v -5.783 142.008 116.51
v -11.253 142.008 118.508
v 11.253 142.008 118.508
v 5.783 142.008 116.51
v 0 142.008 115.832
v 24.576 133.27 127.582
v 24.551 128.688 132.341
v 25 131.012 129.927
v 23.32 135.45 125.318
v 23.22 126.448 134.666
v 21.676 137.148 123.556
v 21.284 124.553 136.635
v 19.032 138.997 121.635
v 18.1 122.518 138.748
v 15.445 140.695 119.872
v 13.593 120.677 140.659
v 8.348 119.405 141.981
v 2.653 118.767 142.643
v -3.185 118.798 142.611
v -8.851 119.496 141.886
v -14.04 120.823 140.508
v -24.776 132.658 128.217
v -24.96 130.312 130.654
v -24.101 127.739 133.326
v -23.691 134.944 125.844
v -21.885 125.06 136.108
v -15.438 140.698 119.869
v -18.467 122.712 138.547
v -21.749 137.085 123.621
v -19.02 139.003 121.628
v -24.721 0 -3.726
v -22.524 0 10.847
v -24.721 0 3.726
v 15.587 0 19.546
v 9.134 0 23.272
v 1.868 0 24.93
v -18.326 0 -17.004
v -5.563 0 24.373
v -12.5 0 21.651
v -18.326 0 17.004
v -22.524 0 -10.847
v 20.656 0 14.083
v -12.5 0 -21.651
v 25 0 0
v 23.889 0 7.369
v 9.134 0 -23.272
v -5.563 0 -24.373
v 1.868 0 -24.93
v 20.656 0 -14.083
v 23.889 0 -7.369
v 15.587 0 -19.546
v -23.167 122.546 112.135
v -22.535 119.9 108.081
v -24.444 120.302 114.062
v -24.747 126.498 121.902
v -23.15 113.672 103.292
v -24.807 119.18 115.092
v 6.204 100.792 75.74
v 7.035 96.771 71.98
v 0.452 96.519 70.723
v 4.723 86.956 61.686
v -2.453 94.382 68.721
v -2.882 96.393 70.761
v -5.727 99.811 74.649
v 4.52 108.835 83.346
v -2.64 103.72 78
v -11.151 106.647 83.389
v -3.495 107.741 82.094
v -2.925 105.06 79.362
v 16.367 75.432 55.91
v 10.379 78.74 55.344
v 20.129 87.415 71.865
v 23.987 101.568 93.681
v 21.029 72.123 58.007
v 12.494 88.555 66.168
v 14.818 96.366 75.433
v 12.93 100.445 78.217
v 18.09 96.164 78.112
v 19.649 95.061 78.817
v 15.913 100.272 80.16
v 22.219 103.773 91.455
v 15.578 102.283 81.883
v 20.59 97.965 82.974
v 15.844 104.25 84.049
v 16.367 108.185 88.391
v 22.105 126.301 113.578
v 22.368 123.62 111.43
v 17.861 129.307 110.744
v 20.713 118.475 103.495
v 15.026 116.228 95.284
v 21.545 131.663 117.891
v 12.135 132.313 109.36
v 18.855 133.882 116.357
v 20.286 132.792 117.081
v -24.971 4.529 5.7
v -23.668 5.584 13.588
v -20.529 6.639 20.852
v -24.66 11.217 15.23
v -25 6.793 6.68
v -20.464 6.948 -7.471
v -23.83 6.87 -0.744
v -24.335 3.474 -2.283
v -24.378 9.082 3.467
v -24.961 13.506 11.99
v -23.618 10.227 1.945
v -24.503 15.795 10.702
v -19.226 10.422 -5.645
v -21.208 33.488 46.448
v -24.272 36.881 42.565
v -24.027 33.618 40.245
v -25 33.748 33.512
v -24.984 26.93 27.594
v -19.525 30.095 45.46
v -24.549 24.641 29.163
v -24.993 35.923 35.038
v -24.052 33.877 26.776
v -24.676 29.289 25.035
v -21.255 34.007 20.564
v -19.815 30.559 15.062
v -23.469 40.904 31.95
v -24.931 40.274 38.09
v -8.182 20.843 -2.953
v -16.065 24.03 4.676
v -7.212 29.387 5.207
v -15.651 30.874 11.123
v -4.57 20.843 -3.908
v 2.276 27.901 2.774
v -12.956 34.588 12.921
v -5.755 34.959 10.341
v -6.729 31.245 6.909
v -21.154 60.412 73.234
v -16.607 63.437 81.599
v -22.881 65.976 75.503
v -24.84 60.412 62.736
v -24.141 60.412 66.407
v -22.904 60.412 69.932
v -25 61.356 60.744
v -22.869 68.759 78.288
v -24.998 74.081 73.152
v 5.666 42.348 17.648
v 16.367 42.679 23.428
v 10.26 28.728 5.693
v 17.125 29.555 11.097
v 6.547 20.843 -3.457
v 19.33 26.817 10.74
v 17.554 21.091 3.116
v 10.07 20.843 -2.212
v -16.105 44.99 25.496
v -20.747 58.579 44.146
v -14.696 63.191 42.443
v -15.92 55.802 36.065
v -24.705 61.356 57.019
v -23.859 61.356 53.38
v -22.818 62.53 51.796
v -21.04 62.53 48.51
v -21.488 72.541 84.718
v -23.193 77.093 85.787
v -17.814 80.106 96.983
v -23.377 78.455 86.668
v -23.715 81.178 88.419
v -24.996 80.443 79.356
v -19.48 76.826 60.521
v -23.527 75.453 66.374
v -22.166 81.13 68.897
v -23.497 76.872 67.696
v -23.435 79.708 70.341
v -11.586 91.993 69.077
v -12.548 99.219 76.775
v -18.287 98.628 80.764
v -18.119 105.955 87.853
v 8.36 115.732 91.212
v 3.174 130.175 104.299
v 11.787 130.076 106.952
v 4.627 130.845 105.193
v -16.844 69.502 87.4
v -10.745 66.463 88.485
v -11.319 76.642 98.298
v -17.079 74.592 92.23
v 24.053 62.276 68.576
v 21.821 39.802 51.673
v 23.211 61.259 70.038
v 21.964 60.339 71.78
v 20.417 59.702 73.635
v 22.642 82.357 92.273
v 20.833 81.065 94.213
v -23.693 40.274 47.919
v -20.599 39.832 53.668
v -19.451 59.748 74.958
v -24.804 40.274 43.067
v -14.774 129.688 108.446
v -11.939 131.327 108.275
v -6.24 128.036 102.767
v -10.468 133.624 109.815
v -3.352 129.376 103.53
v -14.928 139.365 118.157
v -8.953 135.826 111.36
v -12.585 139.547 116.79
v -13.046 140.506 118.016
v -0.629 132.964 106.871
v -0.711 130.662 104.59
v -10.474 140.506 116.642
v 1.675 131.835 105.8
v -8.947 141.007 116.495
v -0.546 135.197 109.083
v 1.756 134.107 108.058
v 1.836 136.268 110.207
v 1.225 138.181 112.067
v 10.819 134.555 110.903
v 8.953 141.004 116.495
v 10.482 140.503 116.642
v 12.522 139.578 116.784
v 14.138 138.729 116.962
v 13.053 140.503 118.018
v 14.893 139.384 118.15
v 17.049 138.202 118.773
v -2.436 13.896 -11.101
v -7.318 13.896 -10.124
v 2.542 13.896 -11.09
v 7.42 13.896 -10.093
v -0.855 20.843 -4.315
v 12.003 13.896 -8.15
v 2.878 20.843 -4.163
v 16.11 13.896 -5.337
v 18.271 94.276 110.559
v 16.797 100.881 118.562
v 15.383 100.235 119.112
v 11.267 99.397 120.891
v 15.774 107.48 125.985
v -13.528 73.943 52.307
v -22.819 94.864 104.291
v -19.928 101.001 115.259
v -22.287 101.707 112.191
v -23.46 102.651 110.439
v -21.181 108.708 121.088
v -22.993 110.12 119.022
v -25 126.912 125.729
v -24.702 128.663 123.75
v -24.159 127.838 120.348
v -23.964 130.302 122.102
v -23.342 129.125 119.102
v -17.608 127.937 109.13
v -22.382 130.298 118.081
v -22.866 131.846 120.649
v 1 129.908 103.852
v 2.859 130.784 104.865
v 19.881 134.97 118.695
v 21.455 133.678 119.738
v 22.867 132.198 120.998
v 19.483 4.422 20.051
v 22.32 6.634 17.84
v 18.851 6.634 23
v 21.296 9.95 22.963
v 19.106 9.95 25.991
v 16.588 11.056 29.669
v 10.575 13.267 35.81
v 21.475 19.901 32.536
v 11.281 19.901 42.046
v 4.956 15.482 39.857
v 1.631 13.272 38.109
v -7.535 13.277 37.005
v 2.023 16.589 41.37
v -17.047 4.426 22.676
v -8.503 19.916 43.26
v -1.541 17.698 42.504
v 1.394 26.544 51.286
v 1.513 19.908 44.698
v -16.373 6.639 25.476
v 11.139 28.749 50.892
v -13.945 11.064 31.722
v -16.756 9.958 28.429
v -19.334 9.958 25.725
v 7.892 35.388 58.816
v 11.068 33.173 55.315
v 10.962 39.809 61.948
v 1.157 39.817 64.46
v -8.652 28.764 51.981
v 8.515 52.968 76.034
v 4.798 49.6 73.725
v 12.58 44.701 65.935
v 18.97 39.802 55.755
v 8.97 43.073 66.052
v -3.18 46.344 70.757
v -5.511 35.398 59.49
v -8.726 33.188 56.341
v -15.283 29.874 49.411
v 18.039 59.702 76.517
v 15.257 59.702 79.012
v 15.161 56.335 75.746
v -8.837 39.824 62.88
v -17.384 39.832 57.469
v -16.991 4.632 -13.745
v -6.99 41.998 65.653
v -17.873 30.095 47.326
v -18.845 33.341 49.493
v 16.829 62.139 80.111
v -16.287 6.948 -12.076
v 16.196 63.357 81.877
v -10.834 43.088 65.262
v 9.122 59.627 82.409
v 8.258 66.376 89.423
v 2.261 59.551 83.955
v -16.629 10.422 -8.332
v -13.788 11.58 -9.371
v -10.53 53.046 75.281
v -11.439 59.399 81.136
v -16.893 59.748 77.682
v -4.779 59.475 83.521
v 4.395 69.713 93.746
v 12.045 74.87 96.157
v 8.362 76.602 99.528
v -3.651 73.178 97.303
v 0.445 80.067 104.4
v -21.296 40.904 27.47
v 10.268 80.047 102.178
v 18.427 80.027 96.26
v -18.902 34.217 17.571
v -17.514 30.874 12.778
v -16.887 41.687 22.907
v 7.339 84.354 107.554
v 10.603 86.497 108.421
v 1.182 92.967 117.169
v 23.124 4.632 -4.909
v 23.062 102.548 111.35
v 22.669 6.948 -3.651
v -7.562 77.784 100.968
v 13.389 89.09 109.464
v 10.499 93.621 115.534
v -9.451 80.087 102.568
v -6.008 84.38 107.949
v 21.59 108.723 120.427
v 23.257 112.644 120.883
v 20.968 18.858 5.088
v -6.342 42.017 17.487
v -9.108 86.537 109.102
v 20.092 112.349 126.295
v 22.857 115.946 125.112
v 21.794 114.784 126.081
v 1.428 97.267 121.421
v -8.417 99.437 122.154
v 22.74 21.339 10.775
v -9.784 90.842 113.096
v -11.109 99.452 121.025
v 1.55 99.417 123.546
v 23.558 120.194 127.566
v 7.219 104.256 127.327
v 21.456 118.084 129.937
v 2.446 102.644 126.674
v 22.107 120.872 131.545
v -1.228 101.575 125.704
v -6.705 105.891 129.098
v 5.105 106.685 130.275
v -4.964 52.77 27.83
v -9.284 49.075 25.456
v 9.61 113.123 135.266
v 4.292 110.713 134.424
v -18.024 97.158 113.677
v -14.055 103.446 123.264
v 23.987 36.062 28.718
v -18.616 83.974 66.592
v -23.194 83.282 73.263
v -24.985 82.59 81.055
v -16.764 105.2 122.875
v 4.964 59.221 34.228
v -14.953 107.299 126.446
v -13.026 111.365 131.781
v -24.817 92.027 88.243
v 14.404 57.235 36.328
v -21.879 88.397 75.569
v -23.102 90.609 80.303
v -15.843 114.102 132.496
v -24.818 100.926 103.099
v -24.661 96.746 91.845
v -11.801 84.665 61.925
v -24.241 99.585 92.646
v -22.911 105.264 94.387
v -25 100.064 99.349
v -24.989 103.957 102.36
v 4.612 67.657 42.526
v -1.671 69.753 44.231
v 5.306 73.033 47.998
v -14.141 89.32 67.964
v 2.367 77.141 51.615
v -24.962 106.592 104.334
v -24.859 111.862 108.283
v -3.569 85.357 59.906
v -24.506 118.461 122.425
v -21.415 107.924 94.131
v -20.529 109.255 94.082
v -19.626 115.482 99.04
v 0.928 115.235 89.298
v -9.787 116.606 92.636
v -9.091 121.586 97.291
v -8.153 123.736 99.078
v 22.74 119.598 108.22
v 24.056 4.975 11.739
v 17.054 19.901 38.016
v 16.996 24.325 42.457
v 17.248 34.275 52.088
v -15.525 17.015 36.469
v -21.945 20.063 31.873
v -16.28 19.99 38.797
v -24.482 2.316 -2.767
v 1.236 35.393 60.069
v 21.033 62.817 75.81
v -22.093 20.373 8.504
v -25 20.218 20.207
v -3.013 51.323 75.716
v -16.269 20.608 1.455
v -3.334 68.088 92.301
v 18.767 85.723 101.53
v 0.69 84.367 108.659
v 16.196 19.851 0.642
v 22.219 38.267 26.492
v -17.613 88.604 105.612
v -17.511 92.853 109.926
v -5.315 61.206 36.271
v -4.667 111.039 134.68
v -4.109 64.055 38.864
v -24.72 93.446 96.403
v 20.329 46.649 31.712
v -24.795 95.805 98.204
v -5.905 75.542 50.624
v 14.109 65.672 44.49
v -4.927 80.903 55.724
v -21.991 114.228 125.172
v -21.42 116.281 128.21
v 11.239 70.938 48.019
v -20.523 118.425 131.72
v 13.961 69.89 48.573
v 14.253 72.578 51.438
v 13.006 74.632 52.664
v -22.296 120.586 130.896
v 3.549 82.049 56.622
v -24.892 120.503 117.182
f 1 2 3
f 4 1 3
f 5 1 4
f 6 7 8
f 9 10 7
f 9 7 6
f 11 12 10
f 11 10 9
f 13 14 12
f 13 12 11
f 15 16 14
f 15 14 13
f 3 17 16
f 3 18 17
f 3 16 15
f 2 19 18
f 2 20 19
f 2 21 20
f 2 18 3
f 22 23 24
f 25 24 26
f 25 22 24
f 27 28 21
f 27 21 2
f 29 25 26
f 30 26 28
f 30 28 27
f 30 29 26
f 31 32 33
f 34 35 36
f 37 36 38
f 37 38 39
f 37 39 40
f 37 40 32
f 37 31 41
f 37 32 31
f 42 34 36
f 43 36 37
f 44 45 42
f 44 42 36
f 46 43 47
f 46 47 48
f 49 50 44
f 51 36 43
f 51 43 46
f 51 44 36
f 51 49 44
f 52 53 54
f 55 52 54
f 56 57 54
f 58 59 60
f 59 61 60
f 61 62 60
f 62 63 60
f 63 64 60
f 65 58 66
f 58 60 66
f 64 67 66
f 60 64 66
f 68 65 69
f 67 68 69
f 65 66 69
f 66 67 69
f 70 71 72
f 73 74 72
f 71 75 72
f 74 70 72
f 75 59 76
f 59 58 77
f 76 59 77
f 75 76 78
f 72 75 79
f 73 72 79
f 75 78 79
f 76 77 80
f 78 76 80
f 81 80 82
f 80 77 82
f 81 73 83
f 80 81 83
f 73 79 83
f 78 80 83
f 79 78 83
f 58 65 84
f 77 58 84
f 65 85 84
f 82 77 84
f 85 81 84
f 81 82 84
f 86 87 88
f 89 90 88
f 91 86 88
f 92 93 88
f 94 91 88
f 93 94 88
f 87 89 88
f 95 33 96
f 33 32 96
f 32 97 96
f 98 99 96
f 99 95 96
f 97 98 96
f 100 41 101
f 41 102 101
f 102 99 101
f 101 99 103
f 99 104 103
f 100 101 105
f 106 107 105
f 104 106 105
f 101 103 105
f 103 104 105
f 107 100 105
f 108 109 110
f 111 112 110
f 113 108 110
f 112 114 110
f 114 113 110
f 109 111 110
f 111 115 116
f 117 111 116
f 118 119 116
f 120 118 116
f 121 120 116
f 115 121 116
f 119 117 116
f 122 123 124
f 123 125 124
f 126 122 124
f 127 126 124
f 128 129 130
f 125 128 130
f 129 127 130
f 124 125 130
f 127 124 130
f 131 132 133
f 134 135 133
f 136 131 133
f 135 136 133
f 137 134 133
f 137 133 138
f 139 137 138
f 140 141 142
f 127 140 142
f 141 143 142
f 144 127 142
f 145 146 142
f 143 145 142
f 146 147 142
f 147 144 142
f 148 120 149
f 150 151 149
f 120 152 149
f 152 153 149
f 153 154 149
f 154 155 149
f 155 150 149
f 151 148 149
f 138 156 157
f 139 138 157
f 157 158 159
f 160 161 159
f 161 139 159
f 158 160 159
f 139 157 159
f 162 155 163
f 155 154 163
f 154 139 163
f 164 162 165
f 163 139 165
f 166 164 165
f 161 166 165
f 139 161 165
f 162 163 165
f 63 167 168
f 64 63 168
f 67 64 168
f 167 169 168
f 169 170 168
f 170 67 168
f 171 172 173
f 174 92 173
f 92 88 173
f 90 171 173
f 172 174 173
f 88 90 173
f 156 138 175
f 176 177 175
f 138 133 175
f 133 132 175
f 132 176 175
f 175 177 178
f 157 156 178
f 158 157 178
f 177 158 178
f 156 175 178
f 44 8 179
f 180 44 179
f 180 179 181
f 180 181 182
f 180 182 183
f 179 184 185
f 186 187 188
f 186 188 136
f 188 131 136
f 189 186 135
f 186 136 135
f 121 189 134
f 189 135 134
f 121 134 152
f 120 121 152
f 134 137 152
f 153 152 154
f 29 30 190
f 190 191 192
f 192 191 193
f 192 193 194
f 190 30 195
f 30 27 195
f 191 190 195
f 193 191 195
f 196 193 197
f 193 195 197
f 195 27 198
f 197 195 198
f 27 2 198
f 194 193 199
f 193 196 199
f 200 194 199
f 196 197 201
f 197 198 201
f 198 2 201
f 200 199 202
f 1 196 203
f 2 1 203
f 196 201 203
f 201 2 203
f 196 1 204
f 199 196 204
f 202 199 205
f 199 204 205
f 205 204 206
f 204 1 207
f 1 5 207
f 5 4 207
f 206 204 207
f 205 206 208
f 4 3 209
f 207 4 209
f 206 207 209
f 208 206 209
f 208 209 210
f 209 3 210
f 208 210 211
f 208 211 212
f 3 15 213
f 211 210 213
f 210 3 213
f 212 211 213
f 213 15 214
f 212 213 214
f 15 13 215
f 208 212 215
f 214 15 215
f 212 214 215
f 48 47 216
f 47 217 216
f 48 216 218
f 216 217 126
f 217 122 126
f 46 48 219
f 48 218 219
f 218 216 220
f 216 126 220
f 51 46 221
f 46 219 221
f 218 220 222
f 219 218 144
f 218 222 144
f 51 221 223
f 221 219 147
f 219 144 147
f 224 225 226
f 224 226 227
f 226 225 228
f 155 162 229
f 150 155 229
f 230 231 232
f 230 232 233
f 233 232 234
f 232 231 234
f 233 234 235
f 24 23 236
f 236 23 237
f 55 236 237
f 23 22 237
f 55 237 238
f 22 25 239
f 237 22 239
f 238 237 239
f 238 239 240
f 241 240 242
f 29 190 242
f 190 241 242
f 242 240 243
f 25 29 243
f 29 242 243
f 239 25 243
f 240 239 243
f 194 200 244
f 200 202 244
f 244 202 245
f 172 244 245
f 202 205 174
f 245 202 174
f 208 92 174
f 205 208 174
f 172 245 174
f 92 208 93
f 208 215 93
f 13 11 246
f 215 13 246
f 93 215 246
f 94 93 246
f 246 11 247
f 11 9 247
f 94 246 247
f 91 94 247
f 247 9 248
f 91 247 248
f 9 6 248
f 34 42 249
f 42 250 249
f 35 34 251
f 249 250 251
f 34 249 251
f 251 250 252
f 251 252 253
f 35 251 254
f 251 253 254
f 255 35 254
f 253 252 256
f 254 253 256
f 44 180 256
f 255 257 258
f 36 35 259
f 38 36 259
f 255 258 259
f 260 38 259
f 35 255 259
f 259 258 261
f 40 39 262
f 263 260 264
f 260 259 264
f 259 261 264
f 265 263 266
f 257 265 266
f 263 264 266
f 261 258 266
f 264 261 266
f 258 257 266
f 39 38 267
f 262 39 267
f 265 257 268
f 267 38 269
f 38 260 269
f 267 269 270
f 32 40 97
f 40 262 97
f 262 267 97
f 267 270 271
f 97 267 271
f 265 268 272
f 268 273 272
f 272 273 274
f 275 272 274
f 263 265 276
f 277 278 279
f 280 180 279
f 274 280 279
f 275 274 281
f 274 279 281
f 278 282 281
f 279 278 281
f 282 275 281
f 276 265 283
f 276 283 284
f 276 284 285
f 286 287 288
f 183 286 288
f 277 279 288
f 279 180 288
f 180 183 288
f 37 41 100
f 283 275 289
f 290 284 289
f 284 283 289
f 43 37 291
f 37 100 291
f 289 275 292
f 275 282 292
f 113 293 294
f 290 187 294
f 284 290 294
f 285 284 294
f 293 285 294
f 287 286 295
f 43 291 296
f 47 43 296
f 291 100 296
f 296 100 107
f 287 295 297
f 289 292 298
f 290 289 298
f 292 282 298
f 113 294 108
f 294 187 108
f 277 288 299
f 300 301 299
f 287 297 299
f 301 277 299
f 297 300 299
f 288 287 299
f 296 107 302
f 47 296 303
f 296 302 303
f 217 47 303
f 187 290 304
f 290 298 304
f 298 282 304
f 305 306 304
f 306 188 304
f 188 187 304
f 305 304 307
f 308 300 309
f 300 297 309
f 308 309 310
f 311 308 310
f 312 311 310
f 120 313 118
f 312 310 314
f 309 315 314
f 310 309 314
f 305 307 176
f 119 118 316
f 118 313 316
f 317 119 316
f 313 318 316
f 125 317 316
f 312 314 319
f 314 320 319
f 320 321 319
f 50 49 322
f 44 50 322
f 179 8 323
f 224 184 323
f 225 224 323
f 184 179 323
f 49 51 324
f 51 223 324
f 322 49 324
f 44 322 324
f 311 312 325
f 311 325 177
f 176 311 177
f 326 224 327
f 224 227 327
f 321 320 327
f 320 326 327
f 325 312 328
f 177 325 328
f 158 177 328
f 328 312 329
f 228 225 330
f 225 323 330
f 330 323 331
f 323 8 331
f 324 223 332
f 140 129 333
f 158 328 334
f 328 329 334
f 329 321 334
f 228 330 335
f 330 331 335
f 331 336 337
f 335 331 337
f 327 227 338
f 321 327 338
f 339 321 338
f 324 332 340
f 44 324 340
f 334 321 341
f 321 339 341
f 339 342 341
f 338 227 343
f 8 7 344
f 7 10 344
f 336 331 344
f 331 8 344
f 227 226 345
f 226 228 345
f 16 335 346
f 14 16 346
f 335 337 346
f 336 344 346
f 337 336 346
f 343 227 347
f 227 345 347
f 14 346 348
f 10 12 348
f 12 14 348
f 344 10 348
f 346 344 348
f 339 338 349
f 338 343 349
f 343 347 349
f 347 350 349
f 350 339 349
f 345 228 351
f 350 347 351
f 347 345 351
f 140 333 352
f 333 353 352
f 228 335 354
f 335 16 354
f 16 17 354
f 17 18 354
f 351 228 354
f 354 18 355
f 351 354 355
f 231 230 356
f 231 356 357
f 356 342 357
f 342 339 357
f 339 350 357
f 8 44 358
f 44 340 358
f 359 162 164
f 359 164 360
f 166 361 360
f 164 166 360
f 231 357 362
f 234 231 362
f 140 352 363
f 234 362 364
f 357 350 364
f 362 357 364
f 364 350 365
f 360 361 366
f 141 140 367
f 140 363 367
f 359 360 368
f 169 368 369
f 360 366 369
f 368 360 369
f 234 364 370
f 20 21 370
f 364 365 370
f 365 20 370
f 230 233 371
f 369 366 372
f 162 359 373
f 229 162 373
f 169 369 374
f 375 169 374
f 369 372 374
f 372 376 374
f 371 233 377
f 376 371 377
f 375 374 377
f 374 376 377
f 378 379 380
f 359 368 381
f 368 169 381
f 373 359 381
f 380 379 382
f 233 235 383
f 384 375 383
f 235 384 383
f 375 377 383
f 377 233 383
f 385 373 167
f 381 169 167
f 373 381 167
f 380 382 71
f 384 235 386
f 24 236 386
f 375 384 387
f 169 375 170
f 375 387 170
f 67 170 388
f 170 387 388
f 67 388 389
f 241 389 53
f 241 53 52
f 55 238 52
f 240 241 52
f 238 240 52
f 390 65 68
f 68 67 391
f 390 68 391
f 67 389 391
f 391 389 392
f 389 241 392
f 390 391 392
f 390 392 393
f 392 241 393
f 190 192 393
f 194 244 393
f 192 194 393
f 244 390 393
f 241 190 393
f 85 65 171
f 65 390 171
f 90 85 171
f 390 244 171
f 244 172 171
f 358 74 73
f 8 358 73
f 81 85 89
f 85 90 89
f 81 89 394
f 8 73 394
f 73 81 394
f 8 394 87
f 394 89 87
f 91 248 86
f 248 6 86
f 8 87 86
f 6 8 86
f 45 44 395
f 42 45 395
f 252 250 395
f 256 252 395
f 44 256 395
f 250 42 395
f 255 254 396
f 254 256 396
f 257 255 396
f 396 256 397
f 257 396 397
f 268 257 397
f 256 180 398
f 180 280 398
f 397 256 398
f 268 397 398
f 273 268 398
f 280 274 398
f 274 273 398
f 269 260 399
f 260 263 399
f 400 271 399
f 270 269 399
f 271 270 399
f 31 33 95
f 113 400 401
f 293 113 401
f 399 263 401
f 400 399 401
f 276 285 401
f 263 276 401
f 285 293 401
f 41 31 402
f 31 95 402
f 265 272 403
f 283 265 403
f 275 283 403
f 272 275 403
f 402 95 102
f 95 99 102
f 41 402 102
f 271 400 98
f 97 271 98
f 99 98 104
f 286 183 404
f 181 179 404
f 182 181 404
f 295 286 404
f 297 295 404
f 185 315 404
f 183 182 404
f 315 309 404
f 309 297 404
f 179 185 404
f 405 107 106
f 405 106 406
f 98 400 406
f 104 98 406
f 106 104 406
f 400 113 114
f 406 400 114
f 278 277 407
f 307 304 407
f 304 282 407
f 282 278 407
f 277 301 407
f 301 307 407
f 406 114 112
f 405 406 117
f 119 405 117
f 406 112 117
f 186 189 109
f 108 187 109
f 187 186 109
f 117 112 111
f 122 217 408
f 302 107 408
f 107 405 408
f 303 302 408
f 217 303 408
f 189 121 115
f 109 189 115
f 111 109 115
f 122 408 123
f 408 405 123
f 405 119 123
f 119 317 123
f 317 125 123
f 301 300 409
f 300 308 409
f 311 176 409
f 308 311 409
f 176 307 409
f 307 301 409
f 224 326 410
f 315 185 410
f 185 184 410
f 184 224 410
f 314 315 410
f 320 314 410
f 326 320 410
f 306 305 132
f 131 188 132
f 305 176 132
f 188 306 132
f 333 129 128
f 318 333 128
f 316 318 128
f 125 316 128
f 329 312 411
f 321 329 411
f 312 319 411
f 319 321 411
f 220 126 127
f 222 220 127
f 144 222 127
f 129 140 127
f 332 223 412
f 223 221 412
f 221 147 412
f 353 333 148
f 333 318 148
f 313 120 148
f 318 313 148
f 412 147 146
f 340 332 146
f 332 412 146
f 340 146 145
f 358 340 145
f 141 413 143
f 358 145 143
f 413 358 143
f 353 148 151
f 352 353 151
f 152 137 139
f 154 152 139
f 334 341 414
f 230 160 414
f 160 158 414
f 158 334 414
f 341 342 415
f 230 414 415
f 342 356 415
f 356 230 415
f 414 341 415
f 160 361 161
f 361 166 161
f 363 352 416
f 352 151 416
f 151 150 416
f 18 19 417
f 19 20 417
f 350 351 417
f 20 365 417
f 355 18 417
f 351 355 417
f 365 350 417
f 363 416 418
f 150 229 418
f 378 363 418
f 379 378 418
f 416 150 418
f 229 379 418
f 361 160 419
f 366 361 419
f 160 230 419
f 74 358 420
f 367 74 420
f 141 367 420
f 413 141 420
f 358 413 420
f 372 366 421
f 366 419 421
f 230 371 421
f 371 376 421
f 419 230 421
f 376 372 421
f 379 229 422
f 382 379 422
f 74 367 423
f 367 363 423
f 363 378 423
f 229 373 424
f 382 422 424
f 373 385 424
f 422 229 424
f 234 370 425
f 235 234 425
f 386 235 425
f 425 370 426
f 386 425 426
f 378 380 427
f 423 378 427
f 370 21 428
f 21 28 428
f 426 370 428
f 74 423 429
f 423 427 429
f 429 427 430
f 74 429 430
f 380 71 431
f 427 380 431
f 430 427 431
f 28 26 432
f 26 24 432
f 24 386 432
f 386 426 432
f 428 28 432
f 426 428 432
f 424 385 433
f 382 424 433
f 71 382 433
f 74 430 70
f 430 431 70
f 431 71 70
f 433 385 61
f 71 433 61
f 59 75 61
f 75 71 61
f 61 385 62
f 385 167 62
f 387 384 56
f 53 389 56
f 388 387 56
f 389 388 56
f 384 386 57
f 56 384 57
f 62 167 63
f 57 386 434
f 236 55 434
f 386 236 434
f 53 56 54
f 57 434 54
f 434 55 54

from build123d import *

# Parameters (mm, degrees)
F1_R     = 25
F4_DEPTH = 49
F5_DEPTH = 92


with BuildPart() as f2:
    # F2: sweep along a path in F0
    with BuildLine(Plane.YZ) as f2_path:
        Line((0, 0), (142.008164, 140.832104))
    # F1 (on Front) → F2 (sweep)
    with BuildSketch(Plane.XZ):
        Circle(F1_R)
    sweep(path=f2_path.line)

    # F3 (on Right) → F4 (cut)
    with BuildSketch(Plane.YZ):
        Polygon((114.125399, 147.46314), (143.182307, 117.288671), (148.33723, 180.407882), align=None)
    extrude(amount=-F4_DEPTH, mode=Mode.SUBTRACT)

    # F3 (on Right) → F5 (cut)
    with BuildSketch(Plane.YZ):
        Polygon((114.125399, 147.46314), (143.182307, 117.288671), (148.33723, 180.407882), align=None)
    extrude(amount=F5_DEPTH, mode=Mode.SUBTRACT)


solid = f2.part
